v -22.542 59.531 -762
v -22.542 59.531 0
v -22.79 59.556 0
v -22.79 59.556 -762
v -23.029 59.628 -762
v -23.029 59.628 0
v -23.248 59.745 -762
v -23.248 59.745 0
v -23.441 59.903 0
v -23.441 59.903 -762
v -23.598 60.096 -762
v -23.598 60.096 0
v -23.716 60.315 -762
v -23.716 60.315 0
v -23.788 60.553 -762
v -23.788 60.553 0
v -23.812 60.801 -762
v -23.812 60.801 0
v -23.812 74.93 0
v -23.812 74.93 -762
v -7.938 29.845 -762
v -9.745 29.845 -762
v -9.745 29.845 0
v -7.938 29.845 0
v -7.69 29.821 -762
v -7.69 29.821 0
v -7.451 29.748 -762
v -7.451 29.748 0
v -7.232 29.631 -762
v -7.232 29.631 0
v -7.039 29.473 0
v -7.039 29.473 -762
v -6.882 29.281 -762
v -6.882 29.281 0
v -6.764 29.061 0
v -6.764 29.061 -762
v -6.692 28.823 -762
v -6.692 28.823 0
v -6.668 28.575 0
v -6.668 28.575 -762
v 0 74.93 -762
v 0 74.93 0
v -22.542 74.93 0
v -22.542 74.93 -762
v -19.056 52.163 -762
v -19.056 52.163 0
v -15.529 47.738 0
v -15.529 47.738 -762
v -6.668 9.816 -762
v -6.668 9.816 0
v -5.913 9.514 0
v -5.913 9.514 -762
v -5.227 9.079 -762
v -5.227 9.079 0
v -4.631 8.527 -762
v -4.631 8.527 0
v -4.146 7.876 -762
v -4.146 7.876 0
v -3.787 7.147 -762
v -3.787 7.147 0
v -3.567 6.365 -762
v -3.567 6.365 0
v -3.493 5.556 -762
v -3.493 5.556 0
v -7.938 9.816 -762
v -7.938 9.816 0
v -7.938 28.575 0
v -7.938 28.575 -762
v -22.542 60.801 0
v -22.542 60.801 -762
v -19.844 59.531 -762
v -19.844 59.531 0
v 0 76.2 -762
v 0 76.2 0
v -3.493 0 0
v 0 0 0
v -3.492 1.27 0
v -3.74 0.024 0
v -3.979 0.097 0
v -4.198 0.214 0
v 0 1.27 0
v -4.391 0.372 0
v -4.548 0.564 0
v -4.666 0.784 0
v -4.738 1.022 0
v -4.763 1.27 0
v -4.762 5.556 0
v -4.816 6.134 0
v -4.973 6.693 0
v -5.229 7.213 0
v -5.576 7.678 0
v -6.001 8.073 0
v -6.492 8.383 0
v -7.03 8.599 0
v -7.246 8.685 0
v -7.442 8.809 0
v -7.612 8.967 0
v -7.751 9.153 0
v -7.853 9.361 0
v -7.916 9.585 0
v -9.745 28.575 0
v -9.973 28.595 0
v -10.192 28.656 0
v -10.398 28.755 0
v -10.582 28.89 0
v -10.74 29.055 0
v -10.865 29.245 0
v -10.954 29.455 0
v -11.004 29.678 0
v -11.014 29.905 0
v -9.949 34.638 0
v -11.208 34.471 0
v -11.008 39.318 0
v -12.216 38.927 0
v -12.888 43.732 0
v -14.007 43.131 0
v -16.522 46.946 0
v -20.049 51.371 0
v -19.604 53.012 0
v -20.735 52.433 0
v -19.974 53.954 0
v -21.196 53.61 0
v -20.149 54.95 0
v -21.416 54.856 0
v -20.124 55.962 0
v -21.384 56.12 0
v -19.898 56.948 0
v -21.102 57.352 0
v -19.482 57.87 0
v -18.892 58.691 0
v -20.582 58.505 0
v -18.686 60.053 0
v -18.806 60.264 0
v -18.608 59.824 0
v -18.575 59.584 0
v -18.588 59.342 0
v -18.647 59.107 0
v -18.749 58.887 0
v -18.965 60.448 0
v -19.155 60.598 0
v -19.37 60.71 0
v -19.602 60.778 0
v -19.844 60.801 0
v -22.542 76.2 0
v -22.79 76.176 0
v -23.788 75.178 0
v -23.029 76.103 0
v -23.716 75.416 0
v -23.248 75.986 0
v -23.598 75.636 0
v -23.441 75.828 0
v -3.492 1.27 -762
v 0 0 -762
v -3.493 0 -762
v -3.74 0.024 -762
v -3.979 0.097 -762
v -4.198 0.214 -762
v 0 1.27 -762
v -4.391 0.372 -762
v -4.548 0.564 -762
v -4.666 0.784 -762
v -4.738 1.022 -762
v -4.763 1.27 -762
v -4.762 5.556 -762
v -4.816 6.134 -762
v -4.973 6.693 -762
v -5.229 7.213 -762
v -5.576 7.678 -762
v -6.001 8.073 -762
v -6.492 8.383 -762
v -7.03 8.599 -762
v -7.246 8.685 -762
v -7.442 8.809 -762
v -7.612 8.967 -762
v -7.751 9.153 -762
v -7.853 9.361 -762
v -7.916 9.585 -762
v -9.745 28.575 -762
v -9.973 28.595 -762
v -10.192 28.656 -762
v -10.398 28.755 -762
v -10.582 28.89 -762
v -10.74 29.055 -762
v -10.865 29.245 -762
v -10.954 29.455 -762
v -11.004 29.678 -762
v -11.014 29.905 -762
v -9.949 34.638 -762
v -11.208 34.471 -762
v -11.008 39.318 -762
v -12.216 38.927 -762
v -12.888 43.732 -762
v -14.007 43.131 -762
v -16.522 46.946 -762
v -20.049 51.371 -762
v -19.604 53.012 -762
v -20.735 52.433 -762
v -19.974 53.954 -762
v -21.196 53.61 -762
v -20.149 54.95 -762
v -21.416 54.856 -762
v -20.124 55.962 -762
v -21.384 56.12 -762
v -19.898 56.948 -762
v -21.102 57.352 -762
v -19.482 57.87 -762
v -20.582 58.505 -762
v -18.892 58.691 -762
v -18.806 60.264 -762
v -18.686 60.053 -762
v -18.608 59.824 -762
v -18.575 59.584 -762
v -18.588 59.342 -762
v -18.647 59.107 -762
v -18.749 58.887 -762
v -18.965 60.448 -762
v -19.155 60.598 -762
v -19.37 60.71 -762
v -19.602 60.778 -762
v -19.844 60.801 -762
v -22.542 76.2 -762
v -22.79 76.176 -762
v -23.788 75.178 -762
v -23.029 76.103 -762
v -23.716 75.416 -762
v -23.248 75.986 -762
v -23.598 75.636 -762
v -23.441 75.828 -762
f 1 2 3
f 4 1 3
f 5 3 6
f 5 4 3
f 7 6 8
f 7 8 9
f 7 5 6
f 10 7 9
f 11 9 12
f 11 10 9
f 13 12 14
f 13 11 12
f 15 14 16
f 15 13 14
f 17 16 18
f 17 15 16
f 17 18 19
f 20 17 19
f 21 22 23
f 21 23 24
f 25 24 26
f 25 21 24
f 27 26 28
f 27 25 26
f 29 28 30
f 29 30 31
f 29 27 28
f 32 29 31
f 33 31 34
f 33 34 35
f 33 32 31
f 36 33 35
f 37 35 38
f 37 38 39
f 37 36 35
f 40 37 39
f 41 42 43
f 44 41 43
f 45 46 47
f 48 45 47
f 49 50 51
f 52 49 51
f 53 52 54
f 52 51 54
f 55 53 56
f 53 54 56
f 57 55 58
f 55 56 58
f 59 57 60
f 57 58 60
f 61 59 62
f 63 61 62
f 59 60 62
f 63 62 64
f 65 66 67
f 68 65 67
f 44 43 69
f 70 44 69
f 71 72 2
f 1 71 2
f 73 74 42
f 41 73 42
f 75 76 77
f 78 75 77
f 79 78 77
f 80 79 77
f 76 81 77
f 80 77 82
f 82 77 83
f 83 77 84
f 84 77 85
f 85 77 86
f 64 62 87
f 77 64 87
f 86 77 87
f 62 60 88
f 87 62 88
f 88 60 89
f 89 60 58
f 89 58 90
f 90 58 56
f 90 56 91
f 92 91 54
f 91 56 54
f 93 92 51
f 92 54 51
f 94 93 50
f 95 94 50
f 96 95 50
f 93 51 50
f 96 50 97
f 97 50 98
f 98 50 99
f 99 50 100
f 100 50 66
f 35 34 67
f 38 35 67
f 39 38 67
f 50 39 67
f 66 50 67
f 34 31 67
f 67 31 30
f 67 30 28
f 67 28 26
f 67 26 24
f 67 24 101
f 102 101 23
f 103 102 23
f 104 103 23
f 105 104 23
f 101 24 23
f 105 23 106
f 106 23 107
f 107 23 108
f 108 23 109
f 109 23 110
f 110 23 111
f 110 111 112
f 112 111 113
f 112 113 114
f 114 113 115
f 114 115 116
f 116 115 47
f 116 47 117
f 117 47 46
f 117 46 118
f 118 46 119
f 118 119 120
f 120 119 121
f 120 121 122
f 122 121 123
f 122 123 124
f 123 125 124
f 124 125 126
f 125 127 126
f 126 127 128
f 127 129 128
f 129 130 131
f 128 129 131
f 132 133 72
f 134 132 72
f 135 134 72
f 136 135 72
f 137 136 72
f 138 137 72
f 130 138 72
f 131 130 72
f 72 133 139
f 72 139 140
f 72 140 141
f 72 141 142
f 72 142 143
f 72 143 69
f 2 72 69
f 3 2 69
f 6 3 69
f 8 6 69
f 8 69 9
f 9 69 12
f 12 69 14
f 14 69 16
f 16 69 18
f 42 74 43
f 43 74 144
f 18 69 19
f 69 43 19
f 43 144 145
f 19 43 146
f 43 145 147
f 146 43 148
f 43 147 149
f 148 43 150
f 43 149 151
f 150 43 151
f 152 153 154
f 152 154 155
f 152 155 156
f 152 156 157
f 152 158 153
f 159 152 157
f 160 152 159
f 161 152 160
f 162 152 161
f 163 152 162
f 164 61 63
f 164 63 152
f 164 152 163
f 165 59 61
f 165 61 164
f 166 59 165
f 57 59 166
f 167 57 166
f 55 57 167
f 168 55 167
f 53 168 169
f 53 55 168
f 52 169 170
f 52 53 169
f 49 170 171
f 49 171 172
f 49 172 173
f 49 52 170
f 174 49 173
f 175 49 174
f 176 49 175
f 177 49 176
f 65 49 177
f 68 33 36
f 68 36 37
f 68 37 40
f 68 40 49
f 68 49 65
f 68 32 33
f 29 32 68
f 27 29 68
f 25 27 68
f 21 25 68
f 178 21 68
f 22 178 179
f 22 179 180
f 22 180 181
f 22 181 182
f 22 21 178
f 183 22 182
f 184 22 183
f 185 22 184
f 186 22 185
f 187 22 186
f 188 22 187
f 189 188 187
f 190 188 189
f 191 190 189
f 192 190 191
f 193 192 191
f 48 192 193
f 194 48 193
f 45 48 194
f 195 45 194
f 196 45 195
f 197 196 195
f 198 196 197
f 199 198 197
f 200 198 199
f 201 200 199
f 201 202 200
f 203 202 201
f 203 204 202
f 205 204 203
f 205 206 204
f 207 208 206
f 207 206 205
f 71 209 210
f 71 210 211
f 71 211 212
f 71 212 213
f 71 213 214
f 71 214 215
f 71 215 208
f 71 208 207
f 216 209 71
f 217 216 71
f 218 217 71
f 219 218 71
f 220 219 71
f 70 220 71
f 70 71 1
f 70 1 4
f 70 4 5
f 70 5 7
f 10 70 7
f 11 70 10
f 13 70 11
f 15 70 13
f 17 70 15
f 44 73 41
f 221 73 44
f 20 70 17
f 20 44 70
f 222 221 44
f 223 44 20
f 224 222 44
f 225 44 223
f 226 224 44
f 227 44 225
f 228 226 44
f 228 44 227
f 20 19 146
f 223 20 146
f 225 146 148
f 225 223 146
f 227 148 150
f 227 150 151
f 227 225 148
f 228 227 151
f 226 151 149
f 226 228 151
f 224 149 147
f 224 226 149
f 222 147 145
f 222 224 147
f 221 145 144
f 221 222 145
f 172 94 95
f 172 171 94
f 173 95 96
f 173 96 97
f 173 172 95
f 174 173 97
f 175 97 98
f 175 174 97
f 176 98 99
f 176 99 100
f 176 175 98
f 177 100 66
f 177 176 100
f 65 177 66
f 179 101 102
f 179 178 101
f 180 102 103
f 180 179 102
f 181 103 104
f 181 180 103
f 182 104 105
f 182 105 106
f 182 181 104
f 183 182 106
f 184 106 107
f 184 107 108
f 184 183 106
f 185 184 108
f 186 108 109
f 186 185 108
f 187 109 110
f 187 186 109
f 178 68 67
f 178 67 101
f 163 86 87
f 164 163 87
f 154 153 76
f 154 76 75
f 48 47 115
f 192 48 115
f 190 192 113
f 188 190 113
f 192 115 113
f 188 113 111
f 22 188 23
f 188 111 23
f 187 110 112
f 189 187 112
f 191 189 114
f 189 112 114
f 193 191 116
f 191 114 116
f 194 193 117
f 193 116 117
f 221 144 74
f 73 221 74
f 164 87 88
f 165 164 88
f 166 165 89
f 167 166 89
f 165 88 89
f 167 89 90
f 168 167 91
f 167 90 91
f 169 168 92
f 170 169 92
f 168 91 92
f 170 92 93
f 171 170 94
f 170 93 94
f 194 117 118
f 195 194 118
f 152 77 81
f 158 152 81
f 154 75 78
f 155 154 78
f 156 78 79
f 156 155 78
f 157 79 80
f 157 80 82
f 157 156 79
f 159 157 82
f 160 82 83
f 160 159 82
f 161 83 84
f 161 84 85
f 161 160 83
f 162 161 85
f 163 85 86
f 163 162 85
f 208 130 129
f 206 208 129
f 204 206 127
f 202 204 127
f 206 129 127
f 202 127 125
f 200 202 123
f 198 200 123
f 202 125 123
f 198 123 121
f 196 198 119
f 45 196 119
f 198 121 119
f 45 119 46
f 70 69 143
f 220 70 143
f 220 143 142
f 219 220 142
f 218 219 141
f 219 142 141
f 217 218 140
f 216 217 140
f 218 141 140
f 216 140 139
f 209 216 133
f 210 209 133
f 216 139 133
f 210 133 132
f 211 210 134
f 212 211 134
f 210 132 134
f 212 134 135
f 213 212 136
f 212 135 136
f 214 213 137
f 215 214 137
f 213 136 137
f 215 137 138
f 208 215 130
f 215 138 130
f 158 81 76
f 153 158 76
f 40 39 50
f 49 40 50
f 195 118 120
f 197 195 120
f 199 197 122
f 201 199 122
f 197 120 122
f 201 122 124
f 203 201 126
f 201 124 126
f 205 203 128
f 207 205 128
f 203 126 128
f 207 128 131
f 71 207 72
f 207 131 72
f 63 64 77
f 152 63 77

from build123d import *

# Parameters (mm, degrees)
BOSS_EXTRUDE2_DEPTH = 762
FILLET2_R           = 1.27


with BuildPart() as part:
    # Sketch1 → Boss-Extrude2 (new body)
    with BuildSketch(Plane.XY):
        with BuildLine():
            Line((0, 0), (-4.7625, 0))
            Line((-4.7625, 0), (-4.7625, 5.55625))
            ThreePointArc((-4.7625, 5.55625), (-5.69243597, 7.80131403), (-7.9375, 8.73125))
            Line((-7.9375, 8.73125), (-7.9375, 28.575))
            Line((-7.9375, 28.575), (-11.1125, 28.575))
            ThreePointArc((-11.1125, 28.575), (-12.019610958, 38.289886849), (-16.522183488, 46.946024405))
            Line((-16.522183488, 46.946024405), (-20.049007231, 51.371088071))
            ThreePointArc((-20.049007231, 51.371088071), (-21.43125, 55.488518856), (-19.84375, 59.53125))
            Line((-19.84375, 59.53125), (-23.8125, 59.53125))
            Line((-23.8125, 59.53125), (-23.8125, 76.2))
            Line((-23.8125, 76.2), (0, 76.2))
            Line((0, 76.2), (0, 74.93))
            Line((0, 74.93), (-22.5425, 74.93))
            Line((-22.5425, 74.93), (-22.5425, 60.80125))
            Line((-22.5425, 60.80125), (-19.84375, 60.80125))
            ThreePointArc((-19.84375, 60.80125), (-18.686099129, 60.053499423), (-18.891651575, 58.690768834))
            ThreePointArc((-18.891651575, 58.690768834), (-20.161651575, 55.456583919), (-19.05585736, 52.162639291))
            Line((-19.05585736, 52.162639291), (-15.529033617, 47.737575625))
            ThreePointArc((-15.529033617, 47.737575625), (-11.00800601, 39.317919875), (-9.745436159, 29.845))
            Line((-9.745436159, 29.845), (-6.6675, 29.845))
            Line((-6.6675, 29.845), (-6.6675, 9.815959497))
            ThreePointArc((-6.6675, 9.815959497), (-4.373571339, 8.212645584), (-3.4925, 5.55625))
            Line((-3.4925, 5.55625), (-3.4925, 1.27))
            Line((-3.4925, 1.27), (0, 1.27))
            Line((0, 1.27), (0, 0))
        make_face()
    extrude(amount=-BOSS_EXTRUDE2_DEPTH)

    # Fillet2
    fillet2_edges = [part.edges().sort_by_distance(p)[0] for p in [
        (-6.6675, 29.845, -381),
        (-4.7625, 0, -381),
        (-7.9375, 8.73125, -381),
        (-11.1125, 28.575, -381),
        (-23.8125, 59.53125, -381),
        (-23.8125, 76.2, -381),
    ]]
    fillet(fillet2_edges, radius=FILLET2_R)


solid = part.part
